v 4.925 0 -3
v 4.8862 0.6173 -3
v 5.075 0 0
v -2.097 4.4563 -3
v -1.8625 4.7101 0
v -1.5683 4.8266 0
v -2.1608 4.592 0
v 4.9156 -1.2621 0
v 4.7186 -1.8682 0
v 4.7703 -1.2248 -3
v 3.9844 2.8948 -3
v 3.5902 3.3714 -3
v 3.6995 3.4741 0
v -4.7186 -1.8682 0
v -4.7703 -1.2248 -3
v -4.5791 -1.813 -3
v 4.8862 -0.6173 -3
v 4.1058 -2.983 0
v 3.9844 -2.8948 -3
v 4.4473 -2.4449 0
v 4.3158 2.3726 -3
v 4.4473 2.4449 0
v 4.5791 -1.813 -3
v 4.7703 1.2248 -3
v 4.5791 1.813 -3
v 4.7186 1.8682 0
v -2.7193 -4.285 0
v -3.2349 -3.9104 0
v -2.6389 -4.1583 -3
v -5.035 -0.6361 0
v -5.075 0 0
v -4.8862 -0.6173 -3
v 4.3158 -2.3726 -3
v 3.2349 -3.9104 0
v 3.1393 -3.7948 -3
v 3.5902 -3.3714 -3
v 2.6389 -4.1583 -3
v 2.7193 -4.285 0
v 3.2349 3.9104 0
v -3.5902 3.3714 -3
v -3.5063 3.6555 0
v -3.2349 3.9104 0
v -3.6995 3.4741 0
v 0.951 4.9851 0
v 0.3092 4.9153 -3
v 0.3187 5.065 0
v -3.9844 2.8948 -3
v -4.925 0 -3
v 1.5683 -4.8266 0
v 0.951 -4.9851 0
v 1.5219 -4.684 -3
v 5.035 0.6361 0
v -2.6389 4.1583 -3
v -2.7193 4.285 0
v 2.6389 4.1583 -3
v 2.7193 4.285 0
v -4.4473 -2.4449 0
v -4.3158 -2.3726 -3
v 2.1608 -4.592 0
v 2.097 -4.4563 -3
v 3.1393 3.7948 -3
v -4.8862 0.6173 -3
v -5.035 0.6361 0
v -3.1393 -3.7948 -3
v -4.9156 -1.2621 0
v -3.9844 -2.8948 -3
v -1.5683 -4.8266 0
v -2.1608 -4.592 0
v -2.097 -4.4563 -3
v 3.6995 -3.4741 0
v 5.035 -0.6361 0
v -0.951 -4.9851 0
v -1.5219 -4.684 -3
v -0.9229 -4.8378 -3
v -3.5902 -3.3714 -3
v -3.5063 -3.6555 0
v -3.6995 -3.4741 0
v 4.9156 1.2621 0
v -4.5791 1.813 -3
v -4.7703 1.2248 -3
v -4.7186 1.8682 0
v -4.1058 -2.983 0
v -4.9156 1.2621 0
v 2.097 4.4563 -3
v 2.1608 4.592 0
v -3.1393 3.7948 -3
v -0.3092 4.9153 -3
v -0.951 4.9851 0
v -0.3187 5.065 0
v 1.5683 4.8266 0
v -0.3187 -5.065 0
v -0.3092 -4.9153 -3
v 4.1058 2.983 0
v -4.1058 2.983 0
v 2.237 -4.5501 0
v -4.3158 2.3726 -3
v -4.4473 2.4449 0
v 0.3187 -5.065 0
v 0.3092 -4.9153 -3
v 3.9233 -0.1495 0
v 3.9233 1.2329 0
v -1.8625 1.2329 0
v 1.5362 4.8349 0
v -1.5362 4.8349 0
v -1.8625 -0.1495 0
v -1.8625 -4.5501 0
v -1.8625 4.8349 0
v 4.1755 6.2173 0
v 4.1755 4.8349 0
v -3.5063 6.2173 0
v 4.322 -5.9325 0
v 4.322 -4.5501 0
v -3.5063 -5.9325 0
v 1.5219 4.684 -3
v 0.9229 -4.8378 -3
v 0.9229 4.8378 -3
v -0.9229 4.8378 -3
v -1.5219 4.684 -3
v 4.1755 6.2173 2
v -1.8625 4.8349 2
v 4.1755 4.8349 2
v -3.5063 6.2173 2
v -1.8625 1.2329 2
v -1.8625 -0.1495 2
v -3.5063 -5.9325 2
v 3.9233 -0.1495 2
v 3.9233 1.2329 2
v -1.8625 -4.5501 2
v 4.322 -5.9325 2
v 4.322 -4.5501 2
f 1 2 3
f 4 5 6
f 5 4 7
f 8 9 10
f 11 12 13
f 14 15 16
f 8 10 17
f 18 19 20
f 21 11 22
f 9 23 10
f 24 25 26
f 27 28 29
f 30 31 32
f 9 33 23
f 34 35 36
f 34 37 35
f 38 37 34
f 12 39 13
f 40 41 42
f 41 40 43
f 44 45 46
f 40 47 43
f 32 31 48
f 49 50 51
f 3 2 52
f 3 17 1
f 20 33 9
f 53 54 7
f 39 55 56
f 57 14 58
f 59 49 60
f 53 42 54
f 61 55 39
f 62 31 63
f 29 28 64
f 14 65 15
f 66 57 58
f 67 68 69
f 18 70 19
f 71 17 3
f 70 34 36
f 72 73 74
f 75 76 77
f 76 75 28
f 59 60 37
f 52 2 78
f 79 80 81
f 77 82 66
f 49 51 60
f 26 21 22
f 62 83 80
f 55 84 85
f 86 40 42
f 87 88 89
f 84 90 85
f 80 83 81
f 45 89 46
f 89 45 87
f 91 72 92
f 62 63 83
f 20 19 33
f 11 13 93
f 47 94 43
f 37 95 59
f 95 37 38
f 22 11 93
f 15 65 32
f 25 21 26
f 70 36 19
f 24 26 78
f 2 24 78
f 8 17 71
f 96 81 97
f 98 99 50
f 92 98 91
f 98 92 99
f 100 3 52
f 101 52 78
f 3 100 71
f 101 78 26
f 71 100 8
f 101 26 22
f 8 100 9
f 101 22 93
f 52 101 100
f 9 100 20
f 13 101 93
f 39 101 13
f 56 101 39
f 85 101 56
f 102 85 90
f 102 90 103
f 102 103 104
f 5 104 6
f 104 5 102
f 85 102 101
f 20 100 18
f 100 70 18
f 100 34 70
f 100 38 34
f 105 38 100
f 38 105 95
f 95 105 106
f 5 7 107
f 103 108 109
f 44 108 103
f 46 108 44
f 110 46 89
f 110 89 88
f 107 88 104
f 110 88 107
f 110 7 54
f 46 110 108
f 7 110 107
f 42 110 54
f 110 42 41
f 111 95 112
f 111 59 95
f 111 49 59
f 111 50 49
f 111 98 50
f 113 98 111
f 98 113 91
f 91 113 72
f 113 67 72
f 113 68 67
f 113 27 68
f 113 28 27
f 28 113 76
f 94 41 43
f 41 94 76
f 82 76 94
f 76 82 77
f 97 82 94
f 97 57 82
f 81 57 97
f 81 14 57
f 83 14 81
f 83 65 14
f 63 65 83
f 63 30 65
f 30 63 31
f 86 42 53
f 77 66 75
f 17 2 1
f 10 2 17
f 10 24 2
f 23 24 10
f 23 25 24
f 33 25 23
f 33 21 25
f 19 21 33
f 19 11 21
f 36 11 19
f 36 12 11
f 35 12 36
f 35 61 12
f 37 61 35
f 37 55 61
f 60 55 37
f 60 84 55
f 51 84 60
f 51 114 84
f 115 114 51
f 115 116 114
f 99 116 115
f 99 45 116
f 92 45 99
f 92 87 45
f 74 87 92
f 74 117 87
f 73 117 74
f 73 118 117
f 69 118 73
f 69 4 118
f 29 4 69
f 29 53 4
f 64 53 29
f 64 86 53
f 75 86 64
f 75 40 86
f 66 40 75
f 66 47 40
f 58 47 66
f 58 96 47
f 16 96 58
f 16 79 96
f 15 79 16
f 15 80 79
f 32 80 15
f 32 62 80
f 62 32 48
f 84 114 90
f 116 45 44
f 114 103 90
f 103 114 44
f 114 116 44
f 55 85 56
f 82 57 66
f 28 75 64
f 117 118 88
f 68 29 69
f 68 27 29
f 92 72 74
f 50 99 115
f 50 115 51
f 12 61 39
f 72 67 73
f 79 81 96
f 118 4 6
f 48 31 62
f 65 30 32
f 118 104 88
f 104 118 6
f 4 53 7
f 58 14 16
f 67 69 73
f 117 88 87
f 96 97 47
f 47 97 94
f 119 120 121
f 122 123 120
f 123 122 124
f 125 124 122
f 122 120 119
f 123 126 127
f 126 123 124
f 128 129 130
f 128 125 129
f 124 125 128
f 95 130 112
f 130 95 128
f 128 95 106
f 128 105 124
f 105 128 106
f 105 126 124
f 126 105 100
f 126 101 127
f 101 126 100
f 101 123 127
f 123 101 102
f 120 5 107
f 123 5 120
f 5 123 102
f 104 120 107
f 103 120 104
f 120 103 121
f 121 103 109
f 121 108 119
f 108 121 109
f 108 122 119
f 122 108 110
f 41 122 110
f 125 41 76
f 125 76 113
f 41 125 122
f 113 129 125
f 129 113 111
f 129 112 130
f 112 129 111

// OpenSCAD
$fn = 50;

difference() {
	union() {
		translate(v = [0, 0, -3.0]) {
			cylinder(h = 3, r1 = 4.925, r2 = 5.075);
		}
		linear_extrude(height = 2) {
			text(font = "Impact", halign = "center", size = 12, text = "E", valign = "center");
		}
	}
	union();
}
